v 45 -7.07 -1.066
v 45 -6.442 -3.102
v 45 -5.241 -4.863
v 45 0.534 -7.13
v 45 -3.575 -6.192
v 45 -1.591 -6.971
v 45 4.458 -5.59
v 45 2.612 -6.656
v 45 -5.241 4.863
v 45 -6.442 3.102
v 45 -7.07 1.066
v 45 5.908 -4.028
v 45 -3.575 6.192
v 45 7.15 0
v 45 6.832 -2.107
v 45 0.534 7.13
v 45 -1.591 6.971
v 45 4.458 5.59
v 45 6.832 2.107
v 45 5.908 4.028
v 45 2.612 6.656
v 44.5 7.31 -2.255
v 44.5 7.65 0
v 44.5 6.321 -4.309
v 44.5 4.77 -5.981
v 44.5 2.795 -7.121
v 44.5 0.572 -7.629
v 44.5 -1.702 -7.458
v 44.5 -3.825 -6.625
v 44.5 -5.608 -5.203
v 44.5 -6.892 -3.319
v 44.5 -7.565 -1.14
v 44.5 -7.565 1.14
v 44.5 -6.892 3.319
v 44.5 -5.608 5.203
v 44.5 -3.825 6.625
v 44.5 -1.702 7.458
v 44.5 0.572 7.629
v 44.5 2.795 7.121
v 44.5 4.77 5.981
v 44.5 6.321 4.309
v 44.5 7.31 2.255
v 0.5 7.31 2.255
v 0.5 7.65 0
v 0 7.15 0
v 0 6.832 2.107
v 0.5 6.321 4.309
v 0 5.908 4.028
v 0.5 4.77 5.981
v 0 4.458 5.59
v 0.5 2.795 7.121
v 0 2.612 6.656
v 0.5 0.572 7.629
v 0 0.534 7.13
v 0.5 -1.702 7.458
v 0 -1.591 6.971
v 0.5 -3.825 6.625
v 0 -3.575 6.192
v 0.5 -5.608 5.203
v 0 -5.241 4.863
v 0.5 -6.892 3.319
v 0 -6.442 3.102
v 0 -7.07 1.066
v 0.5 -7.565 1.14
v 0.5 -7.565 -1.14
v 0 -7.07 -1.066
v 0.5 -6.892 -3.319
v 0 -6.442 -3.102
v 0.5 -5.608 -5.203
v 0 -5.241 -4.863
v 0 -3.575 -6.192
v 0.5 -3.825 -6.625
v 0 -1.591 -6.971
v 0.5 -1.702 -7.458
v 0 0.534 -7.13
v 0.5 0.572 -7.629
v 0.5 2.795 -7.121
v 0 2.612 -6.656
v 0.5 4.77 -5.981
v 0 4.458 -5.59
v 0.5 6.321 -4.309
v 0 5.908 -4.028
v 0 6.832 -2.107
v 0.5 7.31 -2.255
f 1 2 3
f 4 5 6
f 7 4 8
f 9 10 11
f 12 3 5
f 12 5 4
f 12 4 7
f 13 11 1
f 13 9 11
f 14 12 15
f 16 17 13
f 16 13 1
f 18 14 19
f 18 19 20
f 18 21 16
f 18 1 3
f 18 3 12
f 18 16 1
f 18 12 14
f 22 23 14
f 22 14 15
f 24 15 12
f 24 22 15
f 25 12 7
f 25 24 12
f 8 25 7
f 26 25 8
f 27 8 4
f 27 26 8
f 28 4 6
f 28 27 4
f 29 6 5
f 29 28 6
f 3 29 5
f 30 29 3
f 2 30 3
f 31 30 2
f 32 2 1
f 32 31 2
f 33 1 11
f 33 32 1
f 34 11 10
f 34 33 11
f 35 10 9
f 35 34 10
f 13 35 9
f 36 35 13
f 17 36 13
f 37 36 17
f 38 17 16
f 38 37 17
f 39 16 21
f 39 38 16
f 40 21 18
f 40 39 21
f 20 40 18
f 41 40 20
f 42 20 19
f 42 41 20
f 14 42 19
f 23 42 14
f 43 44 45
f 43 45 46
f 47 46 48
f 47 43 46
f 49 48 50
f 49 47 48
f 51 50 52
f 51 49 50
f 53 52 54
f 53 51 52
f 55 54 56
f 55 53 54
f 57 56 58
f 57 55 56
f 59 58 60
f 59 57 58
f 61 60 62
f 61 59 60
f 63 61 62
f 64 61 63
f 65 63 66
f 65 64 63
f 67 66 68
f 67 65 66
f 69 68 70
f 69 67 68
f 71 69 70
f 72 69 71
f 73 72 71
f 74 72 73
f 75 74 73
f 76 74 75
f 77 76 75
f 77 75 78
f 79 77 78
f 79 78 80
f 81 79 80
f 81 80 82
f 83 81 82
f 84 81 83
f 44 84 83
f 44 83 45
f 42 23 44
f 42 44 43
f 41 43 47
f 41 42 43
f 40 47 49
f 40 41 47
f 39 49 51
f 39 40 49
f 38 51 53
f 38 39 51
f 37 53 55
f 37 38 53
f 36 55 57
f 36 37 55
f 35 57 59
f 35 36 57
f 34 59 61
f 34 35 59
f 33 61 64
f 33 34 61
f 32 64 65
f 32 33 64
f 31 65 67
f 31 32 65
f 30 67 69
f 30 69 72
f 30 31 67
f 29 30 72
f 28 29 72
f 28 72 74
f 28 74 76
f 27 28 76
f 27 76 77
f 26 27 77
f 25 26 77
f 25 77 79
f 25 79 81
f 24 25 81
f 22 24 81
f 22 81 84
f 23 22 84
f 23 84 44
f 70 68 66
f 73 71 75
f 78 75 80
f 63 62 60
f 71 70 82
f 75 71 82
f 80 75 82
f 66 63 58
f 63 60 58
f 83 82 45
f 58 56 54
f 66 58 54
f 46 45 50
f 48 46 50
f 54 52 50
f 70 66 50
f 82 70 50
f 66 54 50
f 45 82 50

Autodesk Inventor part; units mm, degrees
ref_plane "Start Plane" through (0, 0, 0) normal (1, 0, 0) x (0, 1, 0)
ref_plane "XZ Plane" through (0, 0, 0) normal (0, 1, 0) x (-1, 0, 0)
ref_plane "XY Plane" through (0, 0, 0) normal (0, 0, 1) x (1, 0, 0)
sketch "Main Sketch" plane through (0, 0, 0) normal (0, 0, 1) x (1, 0, 0)
  line L0 (0, 0) -> (45, 0)
  line L1 (0, 0) -> (0, 7.65)
  line L2 (45, 7.65) -> (45, 0)
  line L3 (0, 7.65) -> (45, 7.65)
  dimension "d3" = 15.3
revolve "Revolution1" add sketch "Main Sketch" angle 360 about axis through (0, 0, 0) along (1, 0, 0)
chamfer "Chamfer3" distance 0.5 angle 45 1 edges at (45, -7.65, 0) measured on face at (30, 7.5509, -1.2271)
chamfer "Chamfer2" distance 0.5 angle 45 1 edges at (0, -7.65, 0) measured on face at (14.8333, 7.6252, -0.6156)
properties part number "Eje silla - Interno" material "Steel"
